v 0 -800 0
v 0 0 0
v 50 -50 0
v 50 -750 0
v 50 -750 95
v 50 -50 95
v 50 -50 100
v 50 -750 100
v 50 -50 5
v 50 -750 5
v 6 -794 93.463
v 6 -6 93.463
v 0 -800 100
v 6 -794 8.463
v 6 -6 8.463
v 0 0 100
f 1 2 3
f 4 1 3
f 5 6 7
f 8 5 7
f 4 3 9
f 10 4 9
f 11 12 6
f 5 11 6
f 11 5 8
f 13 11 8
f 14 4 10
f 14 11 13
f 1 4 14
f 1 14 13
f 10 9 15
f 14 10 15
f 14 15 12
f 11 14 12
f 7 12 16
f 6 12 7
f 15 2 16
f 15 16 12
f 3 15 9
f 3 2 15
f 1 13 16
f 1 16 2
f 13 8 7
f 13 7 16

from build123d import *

# Parameters (mm, degrees)
F1_DEPTH  = 800
F1_FACE_W = 50
F1_FACE_H = 800
F3_DEPTH  = 110


with BuildPart() as f1:
    # F0 (on Front) → F1 (new body)
    with BuildSketch(Plane.XZ):
        Polygon((0, 100), (0, 0), (50, 0), (50, 5), (6, 8.463486), (6, 93.463486), (50, 95), (50, 100), align=None)
    extrude(amount=F1_DEPTH)

    # F2 (on Top) + F1_face (on face) → F3 (cut)
    with BuildSketch(Plane.XY):
        Polygon((87.158154, 52.255962), (0, 52.255962), (0, 0), (87.158154, -87.158154), align=None)
        Polygon((0, -800), (0, -810), (98.867149, -810), (98.867149, -701.132851), align=None)
    with BuildSketch(Plane(origin=(25, -400, 100), x_dir=(1, 0, 0), z_dir=(0, 0, 1))):
        Rectangle(F1_FACE_W, F1_FACE_H)
    extrude(amount=F3_DEPTH, mode=Mode.SUBTRACT)


solid = f1.part
